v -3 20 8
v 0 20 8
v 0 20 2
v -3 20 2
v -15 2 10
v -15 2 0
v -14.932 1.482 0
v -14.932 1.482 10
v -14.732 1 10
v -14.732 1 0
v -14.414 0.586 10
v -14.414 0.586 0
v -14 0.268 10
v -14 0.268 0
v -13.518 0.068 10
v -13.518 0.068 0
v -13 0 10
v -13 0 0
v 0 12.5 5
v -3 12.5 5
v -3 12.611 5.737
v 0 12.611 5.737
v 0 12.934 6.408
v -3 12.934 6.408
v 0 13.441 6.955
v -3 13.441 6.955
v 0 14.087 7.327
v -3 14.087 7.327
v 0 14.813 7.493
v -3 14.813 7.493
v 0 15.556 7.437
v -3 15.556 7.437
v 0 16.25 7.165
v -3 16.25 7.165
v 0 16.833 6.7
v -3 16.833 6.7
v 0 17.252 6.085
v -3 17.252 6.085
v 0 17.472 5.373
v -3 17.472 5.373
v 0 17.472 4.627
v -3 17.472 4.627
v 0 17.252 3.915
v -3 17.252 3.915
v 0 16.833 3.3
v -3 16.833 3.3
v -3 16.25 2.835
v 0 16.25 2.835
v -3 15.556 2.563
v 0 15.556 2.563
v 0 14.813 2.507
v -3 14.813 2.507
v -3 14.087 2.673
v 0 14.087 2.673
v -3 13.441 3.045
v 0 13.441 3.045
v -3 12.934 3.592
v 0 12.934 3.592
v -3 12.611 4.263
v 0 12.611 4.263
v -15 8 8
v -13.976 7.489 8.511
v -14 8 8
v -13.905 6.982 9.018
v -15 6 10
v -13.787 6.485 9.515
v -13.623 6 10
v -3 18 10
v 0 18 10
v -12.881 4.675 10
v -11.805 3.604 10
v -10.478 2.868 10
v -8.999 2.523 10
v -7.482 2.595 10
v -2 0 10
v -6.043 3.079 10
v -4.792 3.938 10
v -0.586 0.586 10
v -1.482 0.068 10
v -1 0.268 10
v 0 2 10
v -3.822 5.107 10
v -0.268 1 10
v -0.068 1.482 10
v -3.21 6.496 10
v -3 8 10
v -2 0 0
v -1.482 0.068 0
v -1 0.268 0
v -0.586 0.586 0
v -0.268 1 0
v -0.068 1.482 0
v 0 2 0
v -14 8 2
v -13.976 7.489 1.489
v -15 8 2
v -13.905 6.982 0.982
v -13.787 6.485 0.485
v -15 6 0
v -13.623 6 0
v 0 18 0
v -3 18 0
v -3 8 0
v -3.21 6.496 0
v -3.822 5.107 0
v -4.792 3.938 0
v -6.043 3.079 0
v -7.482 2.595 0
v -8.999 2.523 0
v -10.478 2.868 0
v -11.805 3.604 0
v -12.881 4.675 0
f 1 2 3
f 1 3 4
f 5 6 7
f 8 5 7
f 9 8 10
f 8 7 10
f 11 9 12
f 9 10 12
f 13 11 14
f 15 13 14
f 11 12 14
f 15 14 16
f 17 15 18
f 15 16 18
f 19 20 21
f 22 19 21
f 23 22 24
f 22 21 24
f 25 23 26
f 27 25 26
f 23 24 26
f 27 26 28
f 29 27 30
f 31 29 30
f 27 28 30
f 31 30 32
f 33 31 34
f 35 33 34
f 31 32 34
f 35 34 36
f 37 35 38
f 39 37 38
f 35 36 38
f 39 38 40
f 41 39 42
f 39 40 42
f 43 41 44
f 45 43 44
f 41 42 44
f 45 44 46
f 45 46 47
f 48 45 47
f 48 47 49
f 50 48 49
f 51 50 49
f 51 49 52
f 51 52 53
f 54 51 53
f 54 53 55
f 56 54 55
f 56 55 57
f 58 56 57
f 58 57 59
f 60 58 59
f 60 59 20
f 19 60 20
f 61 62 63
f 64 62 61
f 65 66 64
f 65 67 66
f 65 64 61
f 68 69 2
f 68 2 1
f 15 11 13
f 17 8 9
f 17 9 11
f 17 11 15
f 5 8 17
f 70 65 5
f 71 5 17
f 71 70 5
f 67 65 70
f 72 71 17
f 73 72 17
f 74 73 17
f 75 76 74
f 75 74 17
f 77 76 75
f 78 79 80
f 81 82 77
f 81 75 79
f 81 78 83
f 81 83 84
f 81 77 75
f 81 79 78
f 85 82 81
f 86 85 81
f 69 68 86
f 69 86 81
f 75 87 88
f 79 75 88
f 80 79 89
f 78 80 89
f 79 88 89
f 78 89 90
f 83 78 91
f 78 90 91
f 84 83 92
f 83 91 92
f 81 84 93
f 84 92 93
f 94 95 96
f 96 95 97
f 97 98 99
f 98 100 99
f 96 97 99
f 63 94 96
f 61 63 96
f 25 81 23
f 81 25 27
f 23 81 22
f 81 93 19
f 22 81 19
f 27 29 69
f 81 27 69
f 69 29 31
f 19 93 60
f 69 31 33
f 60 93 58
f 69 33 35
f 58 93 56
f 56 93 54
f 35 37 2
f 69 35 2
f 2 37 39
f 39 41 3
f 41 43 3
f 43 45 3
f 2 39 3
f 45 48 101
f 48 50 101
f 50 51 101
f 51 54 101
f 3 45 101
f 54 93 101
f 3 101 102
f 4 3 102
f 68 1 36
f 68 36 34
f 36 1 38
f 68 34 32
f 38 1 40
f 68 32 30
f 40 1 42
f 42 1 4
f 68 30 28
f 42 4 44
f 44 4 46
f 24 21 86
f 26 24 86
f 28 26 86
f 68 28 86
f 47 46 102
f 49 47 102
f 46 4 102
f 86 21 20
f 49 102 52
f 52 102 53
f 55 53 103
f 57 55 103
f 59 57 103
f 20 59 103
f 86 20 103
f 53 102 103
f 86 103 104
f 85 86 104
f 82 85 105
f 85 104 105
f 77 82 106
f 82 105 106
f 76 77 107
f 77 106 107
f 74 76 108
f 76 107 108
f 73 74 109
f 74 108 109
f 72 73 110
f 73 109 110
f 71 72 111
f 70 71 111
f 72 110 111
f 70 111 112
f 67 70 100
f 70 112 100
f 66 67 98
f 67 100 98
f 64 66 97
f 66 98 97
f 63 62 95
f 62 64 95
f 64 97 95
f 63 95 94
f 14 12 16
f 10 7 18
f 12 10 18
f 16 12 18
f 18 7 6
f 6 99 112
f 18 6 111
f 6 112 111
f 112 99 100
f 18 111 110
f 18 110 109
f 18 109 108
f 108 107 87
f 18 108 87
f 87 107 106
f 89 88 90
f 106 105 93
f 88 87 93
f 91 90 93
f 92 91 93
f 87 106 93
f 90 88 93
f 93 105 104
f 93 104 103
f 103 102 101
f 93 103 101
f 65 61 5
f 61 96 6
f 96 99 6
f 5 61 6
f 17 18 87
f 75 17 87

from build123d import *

# Parameters (mm, degrees)
F1_DEPTH = 10
F2_SIZE  = 2
F3_R     = 2.5
F4_DEPTH = 25


with BuildPart() as f1:
    # F0 (on Top) → F1 (new body)
    with BuildSketch(Plane.XY):
        with BuildLine():
            ThreePointArc((-2, 0), (-0.585786, 0.585786), (0, 2))
            Line((0, 2), (0, 20))
            Line((0, 20), (-3, 20))
            Line((-3, 20), (-3, 8))
            ThreePointArc((-3, 8), (-8.5, 2.5), (-14, 8))
            Line((-14, 8), (-15, 8))
            Line((-15, 8), (-15, 2))
            ThreePointArc((-15, 2), (-14.414214, 0.585786), (-13, 0))
            Line((-13, 0), (-2, 0))
        make_face()
    extrude(amount=F1_DEPTH)

    # F2
    f2_edges = [f1.edges().sort_by_distance(p)[0] for p in [
        (-1.5, 20, 10),
        (-1.5, 20, 0),
        (-14.5, 8, 10),
        (-14.5, 8, 0),
    ]]
    chamfer(f2_edges, length=F2_SIZE)

    # F3 (on face) → F4 (cut)
    with BuildSketch(Plane(origin=(-3, 0, 0), x_dir=(0, -1, 0), z_dir=(-1, 0, 0))):
        with Locations((-15, 5)):
            Circle(F3_R)
    extrude(amount=-F4_DEPTH, mode=Mode.SUBTRACT)


solid = f1.part
